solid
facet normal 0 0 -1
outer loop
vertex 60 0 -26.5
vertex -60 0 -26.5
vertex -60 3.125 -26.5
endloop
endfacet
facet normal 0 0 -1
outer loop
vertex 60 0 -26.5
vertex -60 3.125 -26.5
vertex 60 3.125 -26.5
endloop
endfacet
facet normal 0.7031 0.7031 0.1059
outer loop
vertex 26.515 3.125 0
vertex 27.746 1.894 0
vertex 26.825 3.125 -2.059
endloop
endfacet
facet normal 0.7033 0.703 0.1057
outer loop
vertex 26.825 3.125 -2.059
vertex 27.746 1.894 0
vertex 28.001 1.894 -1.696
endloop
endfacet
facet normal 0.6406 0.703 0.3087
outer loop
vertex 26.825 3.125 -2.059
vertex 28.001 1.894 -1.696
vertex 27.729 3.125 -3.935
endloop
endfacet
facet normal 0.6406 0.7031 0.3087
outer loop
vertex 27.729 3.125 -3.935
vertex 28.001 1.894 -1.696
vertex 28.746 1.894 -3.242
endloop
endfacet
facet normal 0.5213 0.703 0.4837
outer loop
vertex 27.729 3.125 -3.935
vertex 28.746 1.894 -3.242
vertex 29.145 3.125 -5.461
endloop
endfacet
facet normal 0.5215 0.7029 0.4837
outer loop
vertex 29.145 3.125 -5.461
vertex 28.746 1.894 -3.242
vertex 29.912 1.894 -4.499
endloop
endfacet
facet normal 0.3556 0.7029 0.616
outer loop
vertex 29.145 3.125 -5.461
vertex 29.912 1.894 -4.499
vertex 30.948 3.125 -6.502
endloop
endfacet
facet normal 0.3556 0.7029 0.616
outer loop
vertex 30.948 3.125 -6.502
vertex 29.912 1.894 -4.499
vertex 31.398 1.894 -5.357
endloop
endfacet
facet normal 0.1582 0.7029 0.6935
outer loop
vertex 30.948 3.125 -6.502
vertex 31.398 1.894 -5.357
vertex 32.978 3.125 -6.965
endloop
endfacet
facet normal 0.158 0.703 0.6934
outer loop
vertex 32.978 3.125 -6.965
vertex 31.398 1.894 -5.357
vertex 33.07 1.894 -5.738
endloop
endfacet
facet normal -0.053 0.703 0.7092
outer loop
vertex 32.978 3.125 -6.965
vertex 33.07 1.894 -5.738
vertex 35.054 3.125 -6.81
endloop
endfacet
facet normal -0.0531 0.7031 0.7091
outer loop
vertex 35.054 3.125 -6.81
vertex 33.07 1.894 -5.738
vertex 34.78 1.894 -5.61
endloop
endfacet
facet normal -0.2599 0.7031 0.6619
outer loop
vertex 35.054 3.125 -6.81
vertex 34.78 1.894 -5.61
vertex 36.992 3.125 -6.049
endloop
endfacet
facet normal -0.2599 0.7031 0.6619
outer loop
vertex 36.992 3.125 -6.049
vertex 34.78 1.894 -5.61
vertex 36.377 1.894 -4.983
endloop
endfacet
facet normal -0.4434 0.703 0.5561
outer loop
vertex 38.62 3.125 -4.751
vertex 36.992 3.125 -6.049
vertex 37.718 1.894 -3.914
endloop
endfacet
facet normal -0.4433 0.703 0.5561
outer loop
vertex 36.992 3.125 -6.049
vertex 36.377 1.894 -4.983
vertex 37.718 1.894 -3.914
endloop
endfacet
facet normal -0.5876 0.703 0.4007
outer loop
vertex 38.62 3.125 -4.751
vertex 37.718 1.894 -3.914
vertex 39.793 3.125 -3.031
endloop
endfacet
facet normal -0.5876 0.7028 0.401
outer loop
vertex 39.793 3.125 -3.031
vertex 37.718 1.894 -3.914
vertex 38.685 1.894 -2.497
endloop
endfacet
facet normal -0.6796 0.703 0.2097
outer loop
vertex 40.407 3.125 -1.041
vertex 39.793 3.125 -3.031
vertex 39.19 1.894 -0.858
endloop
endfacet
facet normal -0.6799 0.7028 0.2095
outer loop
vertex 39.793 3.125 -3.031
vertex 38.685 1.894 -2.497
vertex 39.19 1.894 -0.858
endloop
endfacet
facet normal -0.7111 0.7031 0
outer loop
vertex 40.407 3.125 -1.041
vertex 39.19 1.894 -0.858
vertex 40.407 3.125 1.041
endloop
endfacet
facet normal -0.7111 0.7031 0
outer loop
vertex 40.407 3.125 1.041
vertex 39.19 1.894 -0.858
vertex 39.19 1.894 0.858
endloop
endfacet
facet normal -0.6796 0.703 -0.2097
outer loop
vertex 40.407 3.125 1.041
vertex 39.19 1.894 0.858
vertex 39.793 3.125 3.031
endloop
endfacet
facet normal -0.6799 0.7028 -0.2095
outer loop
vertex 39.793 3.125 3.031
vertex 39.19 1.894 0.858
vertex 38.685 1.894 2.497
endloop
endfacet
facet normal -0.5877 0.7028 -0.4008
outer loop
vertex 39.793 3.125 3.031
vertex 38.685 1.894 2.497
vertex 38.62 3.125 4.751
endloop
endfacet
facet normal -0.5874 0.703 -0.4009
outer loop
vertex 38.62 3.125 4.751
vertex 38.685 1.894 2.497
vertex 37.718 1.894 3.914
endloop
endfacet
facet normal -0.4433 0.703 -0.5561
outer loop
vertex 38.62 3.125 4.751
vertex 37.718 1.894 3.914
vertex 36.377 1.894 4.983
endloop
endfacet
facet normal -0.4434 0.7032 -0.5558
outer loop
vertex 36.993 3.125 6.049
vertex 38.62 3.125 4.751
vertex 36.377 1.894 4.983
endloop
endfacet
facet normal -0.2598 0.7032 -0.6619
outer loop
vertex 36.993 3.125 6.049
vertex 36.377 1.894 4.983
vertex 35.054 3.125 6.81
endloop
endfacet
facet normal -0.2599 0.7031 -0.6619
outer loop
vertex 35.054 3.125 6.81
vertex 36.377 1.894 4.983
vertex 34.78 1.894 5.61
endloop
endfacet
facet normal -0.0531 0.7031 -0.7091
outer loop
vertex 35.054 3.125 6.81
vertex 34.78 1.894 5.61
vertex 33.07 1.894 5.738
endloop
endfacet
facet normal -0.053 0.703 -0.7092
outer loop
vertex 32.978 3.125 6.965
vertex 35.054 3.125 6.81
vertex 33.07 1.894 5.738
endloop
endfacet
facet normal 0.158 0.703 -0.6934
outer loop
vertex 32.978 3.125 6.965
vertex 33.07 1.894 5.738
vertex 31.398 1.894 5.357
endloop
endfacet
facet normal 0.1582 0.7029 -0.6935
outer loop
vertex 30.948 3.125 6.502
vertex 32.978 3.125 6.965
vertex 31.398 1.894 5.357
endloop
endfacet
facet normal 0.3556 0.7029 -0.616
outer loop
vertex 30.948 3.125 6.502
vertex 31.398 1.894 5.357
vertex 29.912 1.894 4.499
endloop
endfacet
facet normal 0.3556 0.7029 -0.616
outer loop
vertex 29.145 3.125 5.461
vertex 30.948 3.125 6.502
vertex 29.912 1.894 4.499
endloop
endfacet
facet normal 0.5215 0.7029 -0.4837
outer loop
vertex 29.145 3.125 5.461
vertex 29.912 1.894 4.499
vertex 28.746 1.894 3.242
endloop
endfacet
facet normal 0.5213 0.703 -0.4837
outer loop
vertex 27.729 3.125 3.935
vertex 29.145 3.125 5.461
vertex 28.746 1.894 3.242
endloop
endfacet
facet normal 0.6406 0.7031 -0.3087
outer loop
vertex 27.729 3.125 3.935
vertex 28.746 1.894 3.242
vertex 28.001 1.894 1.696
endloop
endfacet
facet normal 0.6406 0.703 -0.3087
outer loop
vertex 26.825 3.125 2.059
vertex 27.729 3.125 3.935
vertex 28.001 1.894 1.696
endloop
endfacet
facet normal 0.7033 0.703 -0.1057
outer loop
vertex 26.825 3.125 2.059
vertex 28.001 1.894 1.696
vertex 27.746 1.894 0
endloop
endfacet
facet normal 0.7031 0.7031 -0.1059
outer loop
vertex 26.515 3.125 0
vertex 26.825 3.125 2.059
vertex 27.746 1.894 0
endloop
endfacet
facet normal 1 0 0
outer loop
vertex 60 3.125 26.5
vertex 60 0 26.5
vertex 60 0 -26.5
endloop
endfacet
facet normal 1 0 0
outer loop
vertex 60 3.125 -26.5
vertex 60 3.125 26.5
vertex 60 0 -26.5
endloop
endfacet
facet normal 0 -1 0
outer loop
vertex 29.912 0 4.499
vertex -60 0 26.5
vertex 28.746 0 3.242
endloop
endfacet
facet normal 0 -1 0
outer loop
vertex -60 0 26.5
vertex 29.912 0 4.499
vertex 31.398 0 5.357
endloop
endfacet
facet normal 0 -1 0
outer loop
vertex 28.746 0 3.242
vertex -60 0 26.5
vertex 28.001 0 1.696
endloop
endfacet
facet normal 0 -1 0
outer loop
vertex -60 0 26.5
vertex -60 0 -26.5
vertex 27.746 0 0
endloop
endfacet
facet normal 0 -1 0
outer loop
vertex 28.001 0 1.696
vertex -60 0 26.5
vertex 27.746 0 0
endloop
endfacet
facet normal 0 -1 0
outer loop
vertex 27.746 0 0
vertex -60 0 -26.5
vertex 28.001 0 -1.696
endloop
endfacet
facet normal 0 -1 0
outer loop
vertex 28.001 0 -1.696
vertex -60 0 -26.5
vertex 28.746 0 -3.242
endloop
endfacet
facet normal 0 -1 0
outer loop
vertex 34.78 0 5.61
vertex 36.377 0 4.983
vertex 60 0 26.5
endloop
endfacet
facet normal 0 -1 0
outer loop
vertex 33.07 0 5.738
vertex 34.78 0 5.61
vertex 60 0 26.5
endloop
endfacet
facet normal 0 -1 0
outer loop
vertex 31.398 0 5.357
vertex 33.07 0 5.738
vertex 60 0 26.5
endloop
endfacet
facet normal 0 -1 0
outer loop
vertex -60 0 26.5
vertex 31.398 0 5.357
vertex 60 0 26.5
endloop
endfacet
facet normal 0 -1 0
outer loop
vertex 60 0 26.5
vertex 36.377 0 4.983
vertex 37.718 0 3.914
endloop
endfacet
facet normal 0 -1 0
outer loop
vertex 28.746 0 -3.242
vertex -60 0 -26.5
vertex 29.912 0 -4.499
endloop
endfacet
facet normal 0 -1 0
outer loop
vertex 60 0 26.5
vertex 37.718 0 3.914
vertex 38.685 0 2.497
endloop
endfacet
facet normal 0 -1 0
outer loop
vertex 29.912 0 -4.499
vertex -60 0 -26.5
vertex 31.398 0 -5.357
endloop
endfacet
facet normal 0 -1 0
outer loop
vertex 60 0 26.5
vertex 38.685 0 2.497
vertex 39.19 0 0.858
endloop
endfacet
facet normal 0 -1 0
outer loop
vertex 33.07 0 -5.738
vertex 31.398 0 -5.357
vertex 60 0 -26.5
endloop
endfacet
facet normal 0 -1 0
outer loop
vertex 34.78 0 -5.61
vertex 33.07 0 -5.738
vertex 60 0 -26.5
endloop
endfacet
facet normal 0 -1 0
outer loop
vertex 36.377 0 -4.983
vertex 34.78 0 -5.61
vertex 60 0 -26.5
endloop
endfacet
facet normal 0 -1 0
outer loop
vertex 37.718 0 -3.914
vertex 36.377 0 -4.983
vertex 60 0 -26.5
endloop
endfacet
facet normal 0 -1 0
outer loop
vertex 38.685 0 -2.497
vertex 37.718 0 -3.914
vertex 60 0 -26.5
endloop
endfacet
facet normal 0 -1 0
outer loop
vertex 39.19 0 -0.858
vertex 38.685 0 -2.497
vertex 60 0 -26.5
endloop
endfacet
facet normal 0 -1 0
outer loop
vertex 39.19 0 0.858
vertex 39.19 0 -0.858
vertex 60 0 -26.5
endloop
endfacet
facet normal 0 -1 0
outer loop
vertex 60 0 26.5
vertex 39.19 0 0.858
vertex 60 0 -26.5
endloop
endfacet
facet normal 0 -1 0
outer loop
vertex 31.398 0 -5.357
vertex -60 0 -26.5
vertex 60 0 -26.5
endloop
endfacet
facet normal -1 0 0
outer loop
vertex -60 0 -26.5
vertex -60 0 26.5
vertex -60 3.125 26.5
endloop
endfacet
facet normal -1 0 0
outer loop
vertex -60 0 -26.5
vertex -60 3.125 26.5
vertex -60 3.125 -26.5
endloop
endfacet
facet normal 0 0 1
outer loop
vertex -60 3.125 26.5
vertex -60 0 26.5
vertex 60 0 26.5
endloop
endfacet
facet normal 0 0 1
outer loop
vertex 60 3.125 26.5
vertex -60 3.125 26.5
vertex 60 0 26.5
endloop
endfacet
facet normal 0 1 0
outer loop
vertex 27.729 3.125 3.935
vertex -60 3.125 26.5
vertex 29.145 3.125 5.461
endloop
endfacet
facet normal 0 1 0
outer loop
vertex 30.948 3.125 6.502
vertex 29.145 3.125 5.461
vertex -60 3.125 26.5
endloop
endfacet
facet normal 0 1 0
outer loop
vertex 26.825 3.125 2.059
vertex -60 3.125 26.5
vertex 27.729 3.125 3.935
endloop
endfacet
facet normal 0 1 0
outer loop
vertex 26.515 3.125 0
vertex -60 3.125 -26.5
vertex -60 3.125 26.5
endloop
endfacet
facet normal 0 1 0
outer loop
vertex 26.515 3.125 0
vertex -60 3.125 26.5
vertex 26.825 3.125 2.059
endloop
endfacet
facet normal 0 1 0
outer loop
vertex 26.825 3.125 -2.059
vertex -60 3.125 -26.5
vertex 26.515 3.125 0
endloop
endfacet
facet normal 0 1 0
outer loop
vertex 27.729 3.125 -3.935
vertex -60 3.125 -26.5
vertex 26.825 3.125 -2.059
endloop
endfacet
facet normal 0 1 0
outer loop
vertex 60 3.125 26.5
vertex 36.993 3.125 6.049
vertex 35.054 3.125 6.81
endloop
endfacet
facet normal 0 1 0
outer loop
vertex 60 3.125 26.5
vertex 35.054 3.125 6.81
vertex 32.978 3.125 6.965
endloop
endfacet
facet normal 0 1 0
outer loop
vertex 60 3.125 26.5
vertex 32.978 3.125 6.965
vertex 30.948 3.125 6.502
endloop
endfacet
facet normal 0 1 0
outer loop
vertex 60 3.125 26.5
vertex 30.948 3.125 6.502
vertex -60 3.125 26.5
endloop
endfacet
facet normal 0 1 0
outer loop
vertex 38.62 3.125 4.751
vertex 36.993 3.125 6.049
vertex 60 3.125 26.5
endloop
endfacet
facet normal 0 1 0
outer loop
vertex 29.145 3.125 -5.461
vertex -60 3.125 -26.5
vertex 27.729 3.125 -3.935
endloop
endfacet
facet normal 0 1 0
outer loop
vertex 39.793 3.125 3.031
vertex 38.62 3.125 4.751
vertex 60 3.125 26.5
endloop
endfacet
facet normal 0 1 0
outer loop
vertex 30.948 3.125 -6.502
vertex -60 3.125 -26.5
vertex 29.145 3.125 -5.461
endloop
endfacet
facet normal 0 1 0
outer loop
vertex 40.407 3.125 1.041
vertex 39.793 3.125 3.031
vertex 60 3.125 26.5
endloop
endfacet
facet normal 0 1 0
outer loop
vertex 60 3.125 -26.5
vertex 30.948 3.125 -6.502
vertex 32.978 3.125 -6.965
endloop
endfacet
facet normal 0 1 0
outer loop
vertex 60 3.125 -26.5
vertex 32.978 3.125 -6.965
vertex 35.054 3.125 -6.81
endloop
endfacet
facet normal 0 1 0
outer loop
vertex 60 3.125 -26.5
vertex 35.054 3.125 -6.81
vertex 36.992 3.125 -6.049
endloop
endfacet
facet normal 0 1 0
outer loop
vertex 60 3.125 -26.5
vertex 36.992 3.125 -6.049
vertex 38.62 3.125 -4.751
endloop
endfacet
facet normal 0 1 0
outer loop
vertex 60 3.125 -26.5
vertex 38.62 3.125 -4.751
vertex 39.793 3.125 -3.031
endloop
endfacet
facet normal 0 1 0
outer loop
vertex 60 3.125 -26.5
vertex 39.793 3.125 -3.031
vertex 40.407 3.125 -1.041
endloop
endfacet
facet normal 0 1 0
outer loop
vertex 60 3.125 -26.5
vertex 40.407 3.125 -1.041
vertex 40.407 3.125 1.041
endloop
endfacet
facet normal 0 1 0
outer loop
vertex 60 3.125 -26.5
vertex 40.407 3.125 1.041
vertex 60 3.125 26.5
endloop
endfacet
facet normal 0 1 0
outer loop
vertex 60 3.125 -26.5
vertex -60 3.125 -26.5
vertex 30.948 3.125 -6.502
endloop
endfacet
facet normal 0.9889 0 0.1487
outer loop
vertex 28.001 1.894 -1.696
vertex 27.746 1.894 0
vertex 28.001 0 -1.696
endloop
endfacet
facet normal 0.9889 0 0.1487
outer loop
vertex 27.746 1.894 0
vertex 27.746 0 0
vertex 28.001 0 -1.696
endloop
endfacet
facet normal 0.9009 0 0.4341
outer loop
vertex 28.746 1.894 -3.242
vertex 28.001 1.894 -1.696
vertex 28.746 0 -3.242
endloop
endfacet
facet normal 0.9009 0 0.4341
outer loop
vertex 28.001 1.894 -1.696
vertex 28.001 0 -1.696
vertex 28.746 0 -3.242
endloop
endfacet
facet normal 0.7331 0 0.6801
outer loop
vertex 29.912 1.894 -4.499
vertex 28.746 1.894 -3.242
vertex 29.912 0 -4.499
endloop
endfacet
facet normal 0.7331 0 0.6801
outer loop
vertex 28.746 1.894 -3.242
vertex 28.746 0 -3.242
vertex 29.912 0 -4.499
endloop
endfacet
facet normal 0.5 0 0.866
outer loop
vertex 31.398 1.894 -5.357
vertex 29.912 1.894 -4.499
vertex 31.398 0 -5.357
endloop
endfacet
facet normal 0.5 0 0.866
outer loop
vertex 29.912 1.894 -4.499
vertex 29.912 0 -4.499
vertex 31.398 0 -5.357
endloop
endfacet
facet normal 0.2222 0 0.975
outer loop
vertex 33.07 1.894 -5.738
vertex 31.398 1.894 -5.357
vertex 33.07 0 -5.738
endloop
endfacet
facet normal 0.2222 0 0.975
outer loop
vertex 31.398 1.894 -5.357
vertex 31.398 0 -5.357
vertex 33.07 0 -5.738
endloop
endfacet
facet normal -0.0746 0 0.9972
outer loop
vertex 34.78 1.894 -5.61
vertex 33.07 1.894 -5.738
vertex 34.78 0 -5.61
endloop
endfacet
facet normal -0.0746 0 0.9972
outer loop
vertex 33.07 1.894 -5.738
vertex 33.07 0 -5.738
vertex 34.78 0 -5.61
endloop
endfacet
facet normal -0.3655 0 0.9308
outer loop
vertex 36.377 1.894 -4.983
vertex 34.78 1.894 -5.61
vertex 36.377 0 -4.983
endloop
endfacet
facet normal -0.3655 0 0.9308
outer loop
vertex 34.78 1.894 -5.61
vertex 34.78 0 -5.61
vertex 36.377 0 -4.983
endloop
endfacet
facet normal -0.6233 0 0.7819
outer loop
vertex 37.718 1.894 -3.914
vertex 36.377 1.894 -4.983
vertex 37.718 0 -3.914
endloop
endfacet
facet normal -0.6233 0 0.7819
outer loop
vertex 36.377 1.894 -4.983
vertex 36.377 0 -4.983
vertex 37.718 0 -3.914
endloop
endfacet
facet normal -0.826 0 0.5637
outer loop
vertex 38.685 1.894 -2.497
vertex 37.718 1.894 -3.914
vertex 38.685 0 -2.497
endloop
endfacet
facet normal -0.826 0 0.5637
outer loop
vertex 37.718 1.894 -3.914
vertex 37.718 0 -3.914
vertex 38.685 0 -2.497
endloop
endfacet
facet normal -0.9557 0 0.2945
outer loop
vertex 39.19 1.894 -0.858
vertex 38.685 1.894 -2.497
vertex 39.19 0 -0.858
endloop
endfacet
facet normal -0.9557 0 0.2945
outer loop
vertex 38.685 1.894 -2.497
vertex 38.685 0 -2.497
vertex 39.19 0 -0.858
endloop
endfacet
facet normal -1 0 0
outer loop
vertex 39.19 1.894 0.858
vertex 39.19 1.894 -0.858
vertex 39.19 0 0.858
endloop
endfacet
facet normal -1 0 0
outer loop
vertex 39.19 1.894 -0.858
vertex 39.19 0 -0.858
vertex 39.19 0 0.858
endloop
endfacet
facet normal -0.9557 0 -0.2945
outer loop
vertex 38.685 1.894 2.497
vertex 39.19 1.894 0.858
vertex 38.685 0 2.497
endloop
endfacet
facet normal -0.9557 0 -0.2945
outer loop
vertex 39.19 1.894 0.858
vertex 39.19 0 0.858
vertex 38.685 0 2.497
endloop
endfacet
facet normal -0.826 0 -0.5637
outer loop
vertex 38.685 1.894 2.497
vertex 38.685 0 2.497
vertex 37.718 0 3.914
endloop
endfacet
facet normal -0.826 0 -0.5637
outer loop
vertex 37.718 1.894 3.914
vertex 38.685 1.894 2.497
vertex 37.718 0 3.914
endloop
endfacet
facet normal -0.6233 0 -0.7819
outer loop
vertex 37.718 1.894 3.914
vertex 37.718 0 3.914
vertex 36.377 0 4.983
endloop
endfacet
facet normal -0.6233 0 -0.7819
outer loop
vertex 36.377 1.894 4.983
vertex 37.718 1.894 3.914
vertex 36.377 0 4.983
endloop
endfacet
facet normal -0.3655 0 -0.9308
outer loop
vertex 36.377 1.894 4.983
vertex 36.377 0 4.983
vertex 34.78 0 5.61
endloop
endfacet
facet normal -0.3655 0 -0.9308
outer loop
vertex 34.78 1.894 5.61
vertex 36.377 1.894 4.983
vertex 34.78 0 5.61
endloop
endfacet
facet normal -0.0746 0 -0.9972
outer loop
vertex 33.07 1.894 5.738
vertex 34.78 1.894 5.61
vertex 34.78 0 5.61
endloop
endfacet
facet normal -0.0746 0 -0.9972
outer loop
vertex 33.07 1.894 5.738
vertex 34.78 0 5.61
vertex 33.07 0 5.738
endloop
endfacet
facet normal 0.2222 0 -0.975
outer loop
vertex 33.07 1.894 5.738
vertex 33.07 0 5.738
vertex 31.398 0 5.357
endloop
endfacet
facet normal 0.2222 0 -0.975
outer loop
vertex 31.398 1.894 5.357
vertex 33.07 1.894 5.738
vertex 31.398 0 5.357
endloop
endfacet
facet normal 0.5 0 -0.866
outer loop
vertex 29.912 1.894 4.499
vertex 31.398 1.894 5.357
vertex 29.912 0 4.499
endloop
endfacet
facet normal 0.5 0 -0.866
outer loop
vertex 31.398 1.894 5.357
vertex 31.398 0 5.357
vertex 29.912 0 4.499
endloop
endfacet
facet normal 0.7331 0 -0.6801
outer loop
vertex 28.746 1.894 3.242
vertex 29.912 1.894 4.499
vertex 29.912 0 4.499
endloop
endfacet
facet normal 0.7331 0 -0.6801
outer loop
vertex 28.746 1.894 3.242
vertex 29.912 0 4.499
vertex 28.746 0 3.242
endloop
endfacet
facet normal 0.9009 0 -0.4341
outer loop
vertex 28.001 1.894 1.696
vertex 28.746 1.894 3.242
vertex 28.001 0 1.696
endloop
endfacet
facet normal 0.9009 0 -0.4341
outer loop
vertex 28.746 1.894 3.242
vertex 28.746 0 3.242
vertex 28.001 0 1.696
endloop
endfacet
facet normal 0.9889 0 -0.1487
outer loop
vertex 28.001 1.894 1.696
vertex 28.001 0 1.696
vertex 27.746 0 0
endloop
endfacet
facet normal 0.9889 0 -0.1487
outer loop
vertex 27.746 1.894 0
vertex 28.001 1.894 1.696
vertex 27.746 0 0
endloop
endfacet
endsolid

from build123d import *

# Parameters (mm, degrees)
SKETCH1_W                         = 120
SKETCH1_H                         = 53
BOSS_EXTRUDE1_DEPTH               = 3.125
F_1_2_20_TAPPED_HOLE1_D           = 11.50874
F_1_2_20_TAPPED_HOLE1_DEPTH       = 30
F_1_2_20_TAPPED_HOLE1_CSINK_D     = 13.97
F_1_2_20_TAPPED_HOLE1_CSINK_ANGLE = 90
F_1_2_20_TAPPED_HOLE1_TIP         = 3.45757432


with BuildPart() as part:
    # Sketch1 → Boss-Extrude1 (new body)
    with BuildSketch(Plane(origin=(0, 0, 0), x_dir=(1, 0, 0), z_dir=(0, 1, 0))):
        Rectangle(SKETCH1_W, SKETCH1_H)
    extrude(amount=BOSS_EXTRUDE1_DEPTH)

    # 1/2-20 Tapped Hole1
    with Locations(Plane(origin=(0, 3.125, 0), x_dir=(1, 0, 0), z_dir=(0, 1, 0))):
        with Locations((33.5, 0)):
            CounterSinkHole(F_1_2_20_TAPPED_HOLE1_D / 2, F_1_2_20_TAPPED_HOLE1_CSINK_D / 2, depth=F_1_2_20_TAPPED_HOLE1_DEPTH, counter_sink_angle=F_1_2_20_TAPPED_HOLE1_CSINK_ANGLE)
            with Locations((0, 0, -(F_1_2_20_TAPPED_HOLE1_DEPTH + F_1_2_20_TAPPED_HOLE1_TIP / 2))):  # 118° drill point
                Cone(0, F_1_2_20_TAPPED_HOLE1_D / 2, F_1_2_20_TAPPED_HOLE1_TIP, mode=Mode.SUBTRACT)


solid = part.part
